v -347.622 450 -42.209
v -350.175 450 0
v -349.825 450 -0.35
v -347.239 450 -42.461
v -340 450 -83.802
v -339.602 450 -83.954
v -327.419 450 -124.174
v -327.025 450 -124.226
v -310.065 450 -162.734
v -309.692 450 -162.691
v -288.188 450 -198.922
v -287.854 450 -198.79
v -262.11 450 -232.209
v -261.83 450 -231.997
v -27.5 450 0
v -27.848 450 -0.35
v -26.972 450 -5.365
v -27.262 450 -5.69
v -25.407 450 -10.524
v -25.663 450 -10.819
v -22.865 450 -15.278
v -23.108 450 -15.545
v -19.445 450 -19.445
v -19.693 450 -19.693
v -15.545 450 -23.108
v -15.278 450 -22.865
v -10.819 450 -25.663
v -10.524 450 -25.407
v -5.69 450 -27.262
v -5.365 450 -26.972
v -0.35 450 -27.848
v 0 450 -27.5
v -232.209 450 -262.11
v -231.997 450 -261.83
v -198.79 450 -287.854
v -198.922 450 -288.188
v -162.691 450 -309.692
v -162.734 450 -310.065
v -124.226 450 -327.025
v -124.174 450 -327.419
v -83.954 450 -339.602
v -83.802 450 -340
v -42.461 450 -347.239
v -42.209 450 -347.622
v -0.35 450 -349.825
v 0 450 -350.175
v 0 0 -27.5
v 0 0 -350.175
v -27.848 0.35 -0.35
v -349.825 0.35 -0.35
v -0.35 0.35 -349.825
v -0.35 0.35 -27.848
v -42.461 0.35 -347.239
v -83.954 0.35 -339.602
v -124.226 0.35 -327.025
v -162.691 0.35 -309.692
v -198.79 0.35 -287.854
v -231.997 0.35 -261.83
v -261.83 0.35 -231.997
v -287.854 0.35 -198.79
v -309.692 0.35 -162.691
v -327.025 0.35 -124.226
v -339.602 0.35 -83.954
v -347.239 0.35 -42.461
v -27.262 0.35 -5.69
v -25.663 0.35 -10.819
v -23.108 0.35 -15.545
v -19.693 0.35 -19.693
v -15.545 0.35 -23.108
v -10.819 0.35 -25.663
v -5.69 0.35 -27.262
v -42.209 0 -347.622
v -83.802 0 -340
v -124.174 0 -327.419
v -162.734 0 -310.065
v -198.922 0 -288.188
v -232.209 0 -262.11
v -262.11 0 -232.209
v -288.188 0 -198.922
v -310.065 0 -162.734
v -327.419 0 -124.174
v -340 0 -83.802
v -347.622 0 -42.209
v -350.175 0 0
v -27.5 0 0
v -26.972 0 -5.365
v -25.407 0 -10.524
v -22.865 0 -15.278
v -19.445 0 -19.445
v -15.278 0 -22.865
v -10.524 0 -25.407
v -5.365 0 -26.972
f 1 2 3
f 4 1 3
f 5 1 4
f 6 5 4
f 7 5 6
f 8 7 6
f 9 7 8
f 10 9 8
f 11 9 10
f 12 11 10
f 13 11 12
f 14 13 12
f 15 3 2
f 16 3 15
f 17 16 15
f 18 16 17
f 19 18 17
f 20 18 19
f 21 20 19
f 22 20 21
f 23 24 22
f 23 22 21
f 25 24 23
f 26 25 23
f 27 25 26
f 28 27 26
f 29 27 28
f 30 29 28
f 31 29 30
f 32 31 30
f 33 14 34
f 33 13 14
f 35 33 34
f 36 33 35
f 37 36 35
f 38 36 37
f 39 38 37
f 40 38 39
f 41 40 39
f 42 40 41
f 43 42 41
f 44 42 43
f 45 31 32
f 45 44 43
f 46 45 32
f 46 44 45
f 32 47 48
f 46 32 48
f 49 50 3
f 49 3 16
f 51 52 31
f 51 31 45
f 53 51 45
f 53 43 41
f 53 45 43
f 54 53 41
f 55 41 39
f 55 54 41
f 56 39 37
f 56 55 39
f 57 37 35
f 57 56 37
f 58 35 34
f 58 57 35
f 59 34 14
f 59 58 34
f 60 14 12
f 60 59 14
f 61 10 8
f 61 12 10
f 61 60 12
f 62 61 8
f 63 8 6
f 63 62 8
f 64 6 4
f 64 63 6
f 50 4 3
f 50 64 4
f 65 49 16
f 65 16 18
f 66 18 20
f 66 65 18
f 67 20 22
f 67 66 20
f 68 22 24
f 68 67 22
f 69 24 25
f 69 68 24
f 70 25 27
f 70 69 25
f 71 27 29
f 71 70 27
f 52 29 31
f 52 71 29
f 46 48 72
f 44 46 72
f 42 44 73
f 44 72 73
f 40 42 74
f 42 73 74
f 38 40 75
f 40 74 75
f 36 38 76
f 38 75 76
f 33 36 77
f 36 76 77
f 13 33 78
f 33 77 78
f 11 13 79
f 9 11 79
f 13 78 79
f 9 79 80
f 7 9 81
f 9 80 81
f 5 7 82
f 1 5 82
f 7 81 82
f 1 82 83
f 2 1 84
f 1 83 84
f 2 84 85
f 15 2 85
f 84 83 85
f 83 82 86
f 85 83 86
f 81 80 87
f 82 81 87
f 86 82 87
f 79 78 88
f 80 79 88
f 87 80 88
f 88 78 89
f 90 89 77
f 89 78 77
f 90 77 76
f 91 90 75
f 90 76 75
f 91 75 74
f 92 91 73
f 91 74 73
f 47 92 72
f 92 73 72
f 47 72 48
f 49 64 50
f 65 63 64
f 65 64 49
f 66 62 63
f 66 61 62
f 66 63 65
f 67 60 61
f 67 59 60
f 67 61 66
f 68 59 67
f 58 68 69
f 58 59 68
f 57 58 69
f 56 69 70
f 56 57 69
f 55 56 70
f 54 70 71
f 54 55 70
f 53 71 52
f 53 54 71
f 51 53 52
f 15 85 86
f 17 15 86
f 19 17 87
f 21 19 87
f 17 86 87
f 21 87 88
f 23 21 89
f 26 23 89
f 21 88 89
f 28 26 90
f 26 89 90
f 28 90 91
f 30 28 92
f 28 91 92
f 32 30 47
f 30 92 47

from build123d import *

# Parameters (mm, degrees)
BOSS_EXTRUDE1_DEPTH = 450
SHELL1_T            = -0.35


with BuildPart() as part:
    # Sketch1 → Boss-Extrude1 (new body)
    with BuildSketch(Plane(origin=(0, 0, 0), x_dir=(1, 0, 0), z_dir=(0, 1, 0))):
        with BuildLine():
            Line((-350.175, 0), (-27.5, 0))
            ThreePointArc((-27.5, 0), (-19.445436483, 19.445436483), (0, 27.5))
            Line((0, 27.5), (0, 350.175))
            ThreePointArc((0, 350.175), (-247.611117102, 247.611117102), (-350.175, 0))
        make_face()
    extrude(amount=BOSS_EXTRUDE1_DEPTH)

    # Shell1
    shell1_openings = [part.faces().sort_by_distance(p)[0] for p in [
        (-113.973513396, 450, -113.973513396),
    ]]
    offset(amount=SHELL1_T, openings=shell1_openings, kind=Kind.INTERSECTION)


solid = part.part
